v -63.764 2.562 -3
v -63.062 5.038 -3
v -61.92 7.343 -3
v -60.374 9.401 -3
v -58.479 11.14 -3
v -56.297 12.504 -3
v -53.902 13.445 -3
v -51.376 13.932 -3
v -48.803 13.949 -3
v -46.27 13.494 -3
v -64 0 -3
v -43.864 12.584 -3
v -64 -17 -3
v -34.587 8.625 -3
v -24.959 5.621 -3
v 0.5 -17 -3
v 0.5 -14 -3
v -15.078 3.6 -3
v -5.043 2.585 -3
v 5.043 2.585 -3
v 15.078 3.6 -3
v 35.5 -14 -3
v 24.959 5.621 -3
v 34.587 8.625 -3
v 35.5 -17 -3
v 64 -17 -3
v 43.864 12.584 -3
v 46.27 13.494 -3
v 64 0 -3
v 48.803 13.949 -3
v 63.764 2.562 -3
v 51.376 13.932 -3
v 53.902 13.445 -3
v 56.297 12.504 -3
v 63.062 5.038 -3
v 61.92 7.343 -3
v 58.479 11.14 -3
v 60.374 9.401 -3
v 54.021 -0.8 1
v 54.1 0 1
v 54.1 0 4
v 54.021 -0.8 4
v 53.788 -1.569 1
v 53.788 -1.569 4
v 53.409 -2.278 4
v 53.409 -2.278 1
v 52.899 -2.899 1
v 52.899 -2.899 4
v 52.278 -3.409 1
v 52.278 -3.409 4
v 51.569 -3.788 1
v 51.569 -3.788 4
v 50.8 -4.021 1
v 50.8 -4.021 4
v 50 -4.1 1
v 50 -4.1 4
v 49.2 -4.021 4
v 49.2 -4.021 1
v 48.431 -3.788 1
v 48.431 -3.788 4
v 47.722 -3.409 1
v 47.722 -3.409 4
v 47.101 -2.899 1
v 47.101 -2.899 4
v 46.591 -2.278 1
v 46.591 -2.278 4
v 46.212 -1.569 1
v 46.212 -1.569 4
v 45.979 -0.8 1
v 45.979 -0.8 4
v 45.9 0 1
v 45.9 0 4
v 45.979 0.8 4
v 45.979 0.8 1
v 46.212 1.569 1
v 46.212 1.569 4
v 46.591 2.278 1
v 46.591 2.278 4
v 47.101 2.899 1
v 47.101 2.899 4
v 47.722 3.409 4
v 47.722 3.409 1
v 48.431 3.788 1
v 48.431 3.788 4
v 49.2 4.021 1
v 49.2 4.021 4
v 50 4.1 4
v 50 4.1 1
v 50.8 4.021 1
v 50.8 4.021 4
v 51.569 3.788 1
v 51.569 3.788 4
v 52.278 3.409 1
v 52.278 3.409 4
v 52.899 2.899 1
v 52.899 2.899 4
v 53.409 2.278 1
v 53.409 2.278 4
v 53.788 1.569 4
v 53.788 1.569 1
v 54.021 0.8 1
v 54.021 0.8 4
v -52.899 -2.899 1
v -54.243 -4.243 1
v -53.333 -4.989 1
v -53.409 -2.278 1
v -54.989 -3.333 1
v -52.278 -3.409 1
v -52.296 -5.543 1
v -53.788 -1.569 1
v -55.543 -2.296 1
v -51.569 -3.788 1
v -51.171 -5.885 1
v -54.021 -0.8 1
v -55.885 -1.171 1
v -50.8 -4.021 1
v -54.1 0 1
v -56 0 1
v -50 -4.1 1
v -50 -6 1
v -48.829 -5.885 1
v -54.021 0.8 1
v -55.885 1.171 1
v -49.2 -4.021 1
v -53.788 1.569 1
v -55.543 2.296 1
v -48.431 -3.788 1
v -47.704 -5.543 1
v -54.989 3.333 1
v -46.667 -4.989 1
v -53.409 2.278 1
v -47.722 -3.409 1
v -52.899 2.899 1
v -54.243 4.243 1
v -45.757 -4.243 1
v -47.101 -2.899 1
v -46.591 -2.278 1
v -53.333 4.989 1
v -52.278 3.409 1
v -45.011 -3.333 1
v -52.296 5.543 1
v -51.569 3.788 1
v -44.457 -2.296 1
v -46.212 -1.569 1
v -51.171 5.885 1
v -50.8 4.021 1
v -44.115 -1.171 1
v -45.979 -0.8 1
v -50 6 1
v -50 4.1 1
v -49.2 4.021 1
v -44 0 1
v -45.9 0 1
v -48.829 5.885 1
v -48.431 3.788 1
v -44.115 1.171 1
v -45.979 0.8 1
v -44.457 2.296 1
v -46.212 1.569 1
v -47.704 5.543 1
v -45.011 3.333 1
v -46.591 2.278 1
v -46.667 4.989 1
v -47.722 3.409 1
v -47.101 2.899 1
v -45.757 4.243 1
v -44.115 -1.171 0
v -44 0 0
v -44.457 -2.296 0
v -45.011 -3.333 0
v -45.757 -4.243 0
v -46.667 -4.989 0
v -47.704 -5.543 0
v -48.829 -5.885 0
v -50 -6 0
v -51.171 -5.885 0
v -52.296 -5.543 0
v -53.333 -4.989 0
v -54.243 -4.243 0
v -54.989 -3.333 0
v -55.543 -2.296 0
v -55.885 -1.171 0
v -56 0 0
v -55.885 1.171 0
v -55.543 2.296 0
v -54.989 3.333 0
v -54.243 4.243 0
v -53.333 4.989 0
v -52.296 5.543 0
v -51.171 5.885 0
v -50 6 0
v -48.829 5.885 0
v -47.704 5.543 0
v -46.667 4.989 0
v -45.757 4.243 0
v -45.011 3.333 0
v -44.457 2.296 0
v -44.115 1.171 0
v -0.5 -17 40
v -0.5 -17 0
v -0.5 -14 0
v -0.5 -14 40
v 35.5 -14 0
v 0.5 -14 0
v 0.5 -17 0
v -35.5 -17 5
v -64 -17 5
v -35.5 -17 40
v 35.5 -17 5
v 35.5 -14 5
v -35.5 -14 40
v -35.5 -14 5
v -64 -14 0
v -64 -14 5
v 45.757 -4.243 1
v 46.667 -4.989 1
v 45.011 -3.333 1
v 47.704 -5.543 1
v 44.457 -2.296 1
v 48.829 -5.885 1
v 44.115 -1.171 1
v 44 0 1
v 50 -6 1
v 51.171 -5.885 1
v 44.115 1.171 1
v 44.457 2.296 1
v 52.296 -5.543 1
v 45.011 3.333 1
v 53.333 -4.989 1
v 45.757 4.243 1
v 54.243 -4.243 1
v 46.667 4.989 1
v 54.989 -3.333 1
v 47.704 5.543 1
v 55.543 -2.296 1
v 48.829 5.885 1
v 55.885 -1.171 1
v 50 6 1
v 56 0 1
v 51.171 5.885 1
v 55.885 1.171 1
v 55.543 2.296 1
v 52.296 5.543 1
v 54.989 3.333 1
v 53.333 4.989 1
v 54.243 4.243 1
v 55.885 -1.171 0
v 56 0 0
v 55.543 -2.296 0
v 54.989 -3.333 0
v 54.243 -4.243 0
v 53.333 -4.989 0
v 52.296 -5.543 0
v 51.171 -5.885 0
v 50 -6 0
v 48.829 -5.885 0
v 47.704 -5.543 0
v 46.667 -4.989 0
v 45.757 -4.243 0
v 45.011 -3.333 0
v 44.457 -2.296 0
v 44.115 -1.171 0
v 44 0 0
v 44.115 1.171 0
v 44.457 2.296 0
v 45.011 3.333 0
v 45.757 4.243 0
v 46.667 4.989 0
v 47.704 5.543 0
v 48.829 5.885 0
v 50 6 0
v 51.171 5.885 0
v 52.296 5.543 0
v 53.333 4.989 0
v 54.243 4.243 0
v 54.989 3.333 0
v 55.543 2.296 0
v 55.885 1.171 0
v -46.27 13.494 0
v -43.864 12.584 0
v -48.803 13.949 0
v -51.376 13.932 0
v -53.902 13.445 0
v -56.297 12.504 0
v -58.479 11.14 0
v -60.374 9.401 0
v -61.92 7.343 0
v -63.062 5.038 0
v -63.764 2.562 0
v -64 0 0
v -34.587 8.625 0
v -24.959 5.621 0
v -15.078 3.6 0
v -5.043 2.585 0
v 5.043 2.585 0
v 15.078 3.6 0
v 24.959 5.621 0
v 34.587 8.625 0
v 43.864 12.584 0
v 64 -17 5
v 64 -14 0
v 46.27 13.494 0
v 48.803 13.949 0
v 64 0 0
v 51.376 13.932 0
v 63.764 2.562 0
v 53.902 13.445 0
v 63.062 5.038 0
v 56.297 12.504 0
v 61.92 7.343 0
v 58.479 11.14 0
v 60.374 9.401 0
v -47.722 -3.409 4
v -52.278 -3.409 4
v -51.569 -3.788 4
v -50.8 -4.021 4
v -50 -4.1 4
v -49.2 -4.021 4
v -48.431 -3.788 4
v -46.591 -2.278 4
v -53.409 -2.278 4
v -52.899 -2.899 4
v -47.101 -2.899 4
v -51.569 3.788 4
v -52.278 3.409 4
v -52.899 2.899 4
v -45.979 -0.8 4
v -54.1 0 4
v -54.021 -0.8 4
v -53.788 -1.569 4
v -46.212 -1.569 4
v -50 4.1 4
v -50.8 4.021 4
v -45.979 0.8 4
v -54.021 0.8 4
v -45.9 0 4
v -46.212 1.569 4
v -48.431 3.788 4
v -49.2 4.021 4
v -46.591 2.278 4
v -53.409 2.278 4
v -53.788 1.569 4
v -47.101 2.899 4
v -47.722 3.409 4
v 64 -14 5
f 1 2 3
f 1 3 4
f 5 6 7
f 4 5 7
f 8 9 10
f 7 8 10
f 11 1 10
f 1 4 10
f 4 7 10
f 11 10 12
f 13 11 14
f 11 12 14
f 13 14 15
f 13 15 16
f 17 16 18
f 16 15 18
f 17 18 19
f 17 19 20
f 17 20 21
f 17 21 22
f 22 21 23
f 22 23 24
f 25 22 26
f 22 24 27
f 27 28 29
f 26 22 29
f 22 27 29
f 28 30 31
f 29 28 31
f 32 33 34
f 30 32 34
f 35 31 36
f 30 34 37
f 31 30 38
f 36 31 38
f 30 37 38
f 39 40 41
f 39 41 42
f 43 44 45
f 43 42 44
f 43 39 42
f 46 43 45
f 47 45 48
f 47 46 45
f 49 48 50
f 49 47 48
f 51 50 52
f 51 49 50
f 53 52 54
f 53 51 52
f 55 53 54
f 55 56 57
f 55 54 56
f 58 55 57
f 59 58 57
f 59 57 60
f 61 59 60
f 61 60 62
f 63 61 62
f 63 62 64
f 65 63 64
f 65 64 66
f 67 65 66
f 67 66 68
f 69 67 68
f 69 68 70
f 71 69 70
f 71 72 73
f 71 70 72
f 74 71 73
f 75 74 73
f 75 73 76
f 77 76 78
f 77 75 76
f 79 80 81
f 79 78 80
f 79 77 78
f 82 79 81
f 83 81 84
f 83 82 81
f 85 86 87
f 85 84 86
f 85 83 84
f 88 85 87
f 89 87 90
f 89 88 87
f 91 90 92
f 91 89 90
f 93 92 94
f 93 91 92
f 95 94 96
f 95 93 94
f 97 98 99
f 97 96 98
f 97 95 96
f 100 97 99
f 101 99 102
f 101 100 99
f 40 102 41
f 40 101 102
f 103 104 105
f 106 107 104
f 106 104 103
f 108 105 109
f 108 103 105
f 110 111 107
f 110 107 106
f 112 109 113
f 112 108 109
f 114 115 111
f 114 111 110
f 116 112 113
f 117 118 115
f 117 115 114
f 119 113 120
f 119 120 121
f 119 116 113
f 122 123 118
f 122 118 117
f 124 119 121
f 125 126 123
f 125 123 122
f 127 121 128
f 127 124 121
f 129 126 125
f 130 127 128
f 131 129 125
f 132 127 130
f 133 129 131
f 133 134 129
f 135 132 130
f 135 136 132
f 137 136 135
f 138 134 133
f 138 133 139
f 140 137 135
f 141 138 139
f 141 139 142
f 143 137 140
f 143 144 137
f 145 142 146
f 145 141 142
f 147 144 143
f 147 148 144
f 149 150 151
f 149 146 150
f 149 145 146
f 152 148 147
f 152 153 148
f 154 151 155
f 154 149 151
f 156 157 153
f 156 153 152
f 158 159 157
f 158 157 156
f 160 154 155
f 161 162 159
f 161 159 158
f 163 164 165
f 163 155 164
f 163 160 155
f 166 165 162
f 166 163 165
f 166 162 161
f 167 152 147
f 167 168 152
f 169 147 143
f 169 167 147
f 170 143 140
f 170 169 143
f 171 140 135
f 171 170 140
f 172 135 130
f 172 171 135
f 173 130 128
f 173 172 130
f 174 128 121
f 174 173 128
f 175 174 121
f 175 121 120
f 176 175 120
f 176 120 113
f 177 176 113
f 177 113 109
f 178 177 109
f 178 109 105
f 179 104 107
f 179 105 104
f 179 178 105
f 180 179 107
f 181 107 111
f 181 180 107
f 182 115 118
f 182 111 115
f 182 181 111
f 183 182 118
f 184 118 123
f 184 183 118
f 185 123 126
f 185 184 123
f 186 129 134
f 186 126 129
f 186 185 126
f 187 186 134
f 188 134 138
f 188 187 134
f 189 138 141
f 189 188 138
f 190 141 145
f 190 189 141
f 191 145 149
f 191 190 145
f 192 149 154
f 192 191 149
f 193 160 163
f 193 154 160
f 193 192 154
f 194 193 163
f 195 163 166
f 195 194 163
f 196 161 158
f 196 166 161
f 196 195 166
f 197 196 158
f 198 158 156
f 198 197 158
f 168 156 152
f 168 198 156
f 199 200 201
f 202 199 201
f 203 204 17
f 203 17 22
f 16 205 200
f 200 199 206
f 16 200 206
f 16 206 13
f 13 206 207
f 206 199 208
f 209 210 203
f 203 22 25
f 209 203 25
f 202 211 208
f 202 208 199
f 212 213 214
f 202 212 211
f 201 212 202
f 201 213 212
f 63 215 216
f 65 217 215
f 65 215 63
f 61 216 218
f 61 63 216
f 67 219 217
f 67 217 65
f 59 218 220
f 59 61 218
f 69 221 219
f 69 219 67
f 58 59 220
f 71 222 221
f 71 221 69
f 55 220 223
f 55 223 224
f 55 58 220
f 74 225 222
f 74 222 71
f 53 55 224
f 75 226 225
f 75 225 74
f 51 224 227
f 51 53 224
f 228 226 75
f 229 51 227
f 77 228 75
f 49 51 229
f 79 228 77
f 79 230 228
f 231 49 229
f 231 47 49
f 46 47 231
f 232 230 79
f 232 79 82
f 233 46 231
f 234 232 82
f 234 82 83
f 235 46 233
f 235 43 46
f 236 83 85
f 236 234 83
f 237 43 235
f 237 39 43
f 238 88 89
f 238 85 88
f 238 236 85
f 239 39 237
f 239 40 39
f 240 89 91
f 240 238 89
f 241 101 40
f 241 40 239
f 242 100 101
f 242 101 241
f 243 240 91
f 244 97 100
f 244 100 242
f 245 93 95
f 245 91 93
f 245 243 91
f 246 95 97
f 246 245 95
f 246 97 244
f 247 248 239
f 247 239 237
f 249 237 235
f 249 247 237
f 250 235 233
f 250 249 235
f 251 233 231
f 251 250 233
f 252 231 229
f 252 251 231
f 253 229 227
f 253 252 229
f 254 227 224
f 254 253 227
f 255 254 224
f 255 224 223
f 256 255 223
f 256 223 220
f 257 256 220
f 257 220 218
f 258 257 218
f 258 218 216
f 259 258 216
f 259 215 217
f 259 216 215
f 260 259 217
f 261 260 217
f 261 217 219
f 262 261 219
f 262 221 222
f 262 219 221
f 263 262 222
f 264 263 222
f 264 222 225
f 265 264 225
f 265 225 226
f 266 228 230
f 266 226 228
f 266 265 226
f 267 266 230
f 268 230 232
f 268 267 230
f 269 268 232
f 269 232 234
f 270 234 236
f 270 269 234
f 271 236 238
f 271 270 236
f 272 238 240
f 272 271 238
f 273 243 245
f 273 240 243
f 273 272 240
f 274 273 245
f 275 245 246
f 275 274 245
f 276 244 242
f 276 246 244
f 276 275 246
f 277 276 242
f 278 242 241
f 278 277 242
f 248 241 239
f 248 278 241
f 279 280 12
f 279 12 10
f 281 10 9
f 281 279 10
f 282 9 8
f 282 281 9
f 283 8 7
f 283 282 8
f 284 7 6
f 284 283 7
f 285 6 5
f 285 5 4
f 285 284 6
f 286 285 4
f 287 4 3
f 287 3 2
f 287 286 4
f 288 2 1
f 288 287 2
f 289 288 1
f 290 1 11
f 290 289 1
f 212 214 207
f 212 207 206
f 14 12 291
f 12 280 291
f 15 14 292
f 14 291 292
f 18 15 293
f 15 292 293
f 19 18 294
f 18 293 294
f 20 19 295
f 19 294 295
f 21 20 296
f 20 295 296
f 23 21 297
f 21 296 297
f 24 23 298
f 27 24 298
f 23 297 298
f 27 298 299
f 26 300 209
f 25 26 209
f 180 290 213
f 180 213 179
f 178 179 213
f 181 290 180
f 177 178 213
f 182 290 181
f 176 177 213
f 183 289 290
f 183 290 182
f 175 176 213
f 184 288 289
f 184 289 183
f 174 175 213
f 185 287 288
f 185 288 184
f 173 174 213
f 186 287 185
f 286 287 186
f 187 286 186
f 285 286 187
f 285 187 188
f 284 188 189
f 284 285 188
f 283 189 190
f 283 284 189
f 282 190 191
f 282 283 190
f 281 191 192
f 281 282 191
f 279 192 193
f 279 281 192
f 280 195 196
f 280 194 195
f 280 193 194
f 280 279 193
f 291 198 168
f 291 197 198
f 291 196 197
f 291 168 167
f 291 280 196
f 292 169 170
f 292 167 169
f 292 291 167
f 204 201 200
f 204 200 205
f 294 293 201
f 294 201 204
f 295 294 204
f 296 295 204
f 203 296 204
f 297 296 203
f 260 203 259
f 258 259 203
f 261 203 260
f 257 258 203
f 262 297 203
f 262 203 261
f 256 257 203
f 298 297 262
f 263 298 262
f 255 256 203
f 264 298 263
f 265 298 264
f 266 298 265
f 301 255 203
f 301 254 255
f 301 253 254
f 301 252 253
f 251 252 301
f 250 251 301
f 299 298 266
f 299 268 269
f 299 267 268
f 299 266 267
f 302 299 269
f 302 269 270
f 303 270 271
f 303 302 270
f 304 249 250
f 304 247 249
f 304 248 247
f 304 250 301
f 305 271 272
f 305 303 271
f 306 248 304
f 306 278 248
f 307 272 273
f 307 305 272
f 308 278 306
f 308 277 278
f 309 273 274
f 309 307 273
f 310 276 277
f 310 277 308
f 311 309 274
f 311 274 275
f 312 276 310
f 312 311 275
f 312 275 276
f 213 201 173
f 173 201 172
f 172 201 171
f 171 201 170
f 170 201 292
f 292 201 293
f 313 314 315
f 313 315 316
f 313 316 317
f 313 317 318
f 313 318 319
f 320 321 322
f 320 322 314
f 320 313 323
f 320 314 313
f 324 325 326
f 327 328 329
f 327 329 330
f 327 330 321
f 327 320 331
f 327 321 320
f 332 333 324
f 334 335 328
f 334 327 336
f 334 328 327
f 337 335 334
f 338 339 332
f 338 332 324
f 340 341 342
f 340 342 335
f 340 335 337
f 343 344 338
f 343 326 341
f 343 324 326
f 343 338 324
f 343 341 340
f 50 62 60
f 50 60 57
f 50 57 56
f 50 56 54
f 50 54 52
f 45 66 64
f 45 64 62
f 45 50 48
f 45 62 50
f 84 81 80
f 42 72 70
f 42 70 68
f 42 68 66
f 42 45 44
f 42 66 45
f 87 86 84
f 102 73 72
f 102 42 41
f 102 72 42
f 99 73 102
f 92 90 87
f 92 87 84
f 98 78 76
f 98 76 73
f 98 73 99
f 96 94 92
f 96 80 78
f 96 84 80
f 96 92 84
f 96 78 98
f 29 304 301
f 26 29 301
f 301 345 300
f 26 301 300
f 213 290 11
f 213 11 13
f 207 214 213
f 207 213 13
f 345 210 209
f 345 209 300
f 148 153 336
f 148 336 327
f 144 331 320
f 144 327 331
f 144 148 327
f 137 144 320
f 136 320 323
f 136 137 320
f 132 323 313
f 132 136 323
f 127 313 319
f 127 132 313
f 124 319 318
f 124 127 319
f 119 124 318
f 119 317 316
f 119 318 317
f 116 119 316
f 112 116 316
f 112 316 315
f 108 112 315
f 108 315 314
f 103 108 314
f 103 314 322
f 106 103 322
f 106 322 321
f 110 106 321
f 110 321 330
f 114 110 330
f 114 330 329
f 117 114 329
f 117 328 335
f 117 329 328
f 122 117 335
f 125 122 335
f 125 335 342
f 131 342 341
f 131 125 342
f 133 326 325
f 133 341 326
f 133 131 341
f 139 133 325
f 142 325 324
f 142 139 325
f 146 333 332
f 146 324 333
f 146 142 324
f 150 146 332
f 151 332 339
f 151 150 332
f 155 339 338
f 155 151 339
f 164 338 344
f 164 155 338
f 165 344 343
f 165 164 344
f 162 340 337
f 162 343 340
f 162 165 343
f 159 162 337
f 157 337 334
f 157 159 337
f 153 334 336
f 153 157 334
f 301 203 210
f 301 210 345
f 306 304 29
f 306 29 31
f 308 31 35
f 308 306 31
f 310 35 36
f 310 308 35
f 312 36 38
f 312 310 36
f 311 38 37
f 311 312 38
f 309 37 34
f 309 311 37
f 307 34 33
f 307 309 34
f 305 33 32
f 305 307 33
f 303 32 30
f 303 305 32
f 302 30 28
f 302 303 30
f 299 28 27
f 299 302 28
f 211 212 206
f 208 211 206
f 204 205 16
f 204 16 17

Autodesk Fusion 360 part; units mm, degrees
sketch "Sketch1" plane through (0, 0, 0) normal (0, 0, 1) x (1, 0, 0)
  circle A0 centre (-50, 0) radius 4.1
  circle A1 centre (50, 0) radius 4.1
  circle A2 centre (50, 0) radius 14
  circle A3 centre (50, 0) radius 6
  circle A4 centre (-50, 0) radius 14
  circle A5 centre (-50, 0) radius 6
  line L0 (-64, -14) -> (64, -14)
  line L1 (-64, 0) -> (-64, -14)
  line L2 (64, 0) -> (64, -14)
  arc A6 (-43.8635, 12.5835) -> (43.8635, 12.5835) centre (0, 102.5297) ccw
  line L3 (-64, -14) -> (64, -14)
  line L4 (64, -14) -> (64, -17)
  line L5 (64, -17) -> (-64, -17)
  line L6 (-64, -17) -> (-64, -14)
  line L7 (0.5, -14) -> (35.5, -14)
  line L8 (35.5, -14) -> (35.5, -17)
  line L9 (35.5, -17) -> (0.5, -17)
  line L10 (0.5, -17) -> (0.5, -14)
  line L11 (-0.5, -14) -> (-35.5, -14)
  line L12 (-35.5, -14) -> (-35.5, -17)
  line L13 (-35.5, -17) -> (-0.5, -17)
  line L14 (-0.5, -17) -> (-0.5, -14)
  point P0 (-0.113, 2.4581)
  dimension "d1" = 8.2
  dimension "d2" = 8.2
  dimension "d3" = 50
  dimension "d4" = 50
  dimension "d5" = 28
  dimension "d6" = 12
  dimension "d7" = 28
  dimension "d8" = 12
  dimension "d9" = 14
  dimension "d10" = 3
  dimension "d11" = 3
  dimension "d12" = 35
  dimension "d13" = 35.5
  dimension "d20" = 35
  dimension "d21" = 35.5
extrude "Extrude1" add sketch "Sketch1" against normal blind 3 contours A0 | A1 | A2 | A2 L0 L2 L3 | A2 A4 L0 A6 L3 L7 L11 | L0 L3 L4 L5 L8 | A4 | A4 L0 L1 L3 | L0 L3 L5 L10 L14 | L0 L3 L5 L6 L12 | L0 L3 L5 L11 L12 L13 L14 | A3 | A5
extrude "Extrude2" add sketch "Sketch1" along normal blind 1 contours A3 | A5
extrude "Extrude3" add sketch "Sketch1" along normal blind 4 contours A0 | A1
extrude "Extrude4" add sketch "Sketch1" along normal blind 40 contours L0 L3 L5 L11 L12 L13 L14
extrude "Extrude5" add sketch "Sketch1" along normal blind 5 contours L0 L3 L4 L5 L8 | L0 L3 L5 L6 L12
